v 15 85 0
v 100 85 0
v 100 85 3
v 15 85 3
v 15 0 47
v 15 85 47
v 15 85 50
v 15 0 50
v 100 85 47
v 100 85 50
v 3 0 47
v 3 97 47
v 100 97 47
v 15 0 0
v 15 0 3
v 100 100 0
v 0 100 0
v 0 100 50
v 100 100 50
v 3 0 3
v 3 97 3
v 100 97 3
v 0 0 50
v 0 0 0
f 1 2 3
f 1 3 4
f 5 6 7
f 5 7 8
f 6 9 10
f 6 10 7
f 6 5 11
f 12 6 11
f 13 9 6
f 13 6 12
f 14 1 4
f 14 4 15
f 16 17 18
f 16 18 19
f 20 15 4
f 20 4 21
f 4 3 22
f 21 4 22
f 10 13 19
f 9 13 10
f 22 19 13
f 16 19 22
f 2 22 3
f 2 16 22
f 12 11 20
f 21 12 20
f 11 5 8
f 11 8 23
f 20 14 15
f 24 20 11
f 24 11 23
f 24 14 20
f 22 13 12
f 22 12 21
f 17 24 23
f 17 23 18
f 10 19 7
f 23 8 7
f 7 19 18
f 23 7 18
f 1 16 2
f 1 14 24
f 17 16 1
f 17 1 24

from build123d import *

# Parameters (mm, degrees)
LINEAR_AUSTRAGEN_D_NN1_DEPTH    = 50
SKIZZE3_W                       = 44
SKIZZE3_H                       = 100.666411599
SCHNITT_LINEAR_AUSTRAGEN2_DEPTH = 97


with BuildPart() as part:
    # Skizze1 → Linear-Austragen-Dünn1 (new body)
    with BuildSketch(Plane.XY):
        Polygon((0, 0), (0, 100), (100, 100), (100, 85), (15, 85), (15, 0), align=None)
    extrude(amount=LINEAR_AUSTRAGEN_D_NN1_DEPTH)

    # Skizze3 → Schnitt-Linear austragen2 (cut)
    with BuildSketch(Plane(origin=(100, 0, 0), x_dir=(0, 0, -1), z_dir=(1, 0, 0))):
        with Locations((-25, 46.666794201)):
            Rectangle(SKIZZE3_W, SKIZZE3_H)
    extrude(amount=-SCHNITT_LINEAR_AUSTRAGEN2_DEPTH, mode=Mode.SUBTRACT)


solid = part.part
